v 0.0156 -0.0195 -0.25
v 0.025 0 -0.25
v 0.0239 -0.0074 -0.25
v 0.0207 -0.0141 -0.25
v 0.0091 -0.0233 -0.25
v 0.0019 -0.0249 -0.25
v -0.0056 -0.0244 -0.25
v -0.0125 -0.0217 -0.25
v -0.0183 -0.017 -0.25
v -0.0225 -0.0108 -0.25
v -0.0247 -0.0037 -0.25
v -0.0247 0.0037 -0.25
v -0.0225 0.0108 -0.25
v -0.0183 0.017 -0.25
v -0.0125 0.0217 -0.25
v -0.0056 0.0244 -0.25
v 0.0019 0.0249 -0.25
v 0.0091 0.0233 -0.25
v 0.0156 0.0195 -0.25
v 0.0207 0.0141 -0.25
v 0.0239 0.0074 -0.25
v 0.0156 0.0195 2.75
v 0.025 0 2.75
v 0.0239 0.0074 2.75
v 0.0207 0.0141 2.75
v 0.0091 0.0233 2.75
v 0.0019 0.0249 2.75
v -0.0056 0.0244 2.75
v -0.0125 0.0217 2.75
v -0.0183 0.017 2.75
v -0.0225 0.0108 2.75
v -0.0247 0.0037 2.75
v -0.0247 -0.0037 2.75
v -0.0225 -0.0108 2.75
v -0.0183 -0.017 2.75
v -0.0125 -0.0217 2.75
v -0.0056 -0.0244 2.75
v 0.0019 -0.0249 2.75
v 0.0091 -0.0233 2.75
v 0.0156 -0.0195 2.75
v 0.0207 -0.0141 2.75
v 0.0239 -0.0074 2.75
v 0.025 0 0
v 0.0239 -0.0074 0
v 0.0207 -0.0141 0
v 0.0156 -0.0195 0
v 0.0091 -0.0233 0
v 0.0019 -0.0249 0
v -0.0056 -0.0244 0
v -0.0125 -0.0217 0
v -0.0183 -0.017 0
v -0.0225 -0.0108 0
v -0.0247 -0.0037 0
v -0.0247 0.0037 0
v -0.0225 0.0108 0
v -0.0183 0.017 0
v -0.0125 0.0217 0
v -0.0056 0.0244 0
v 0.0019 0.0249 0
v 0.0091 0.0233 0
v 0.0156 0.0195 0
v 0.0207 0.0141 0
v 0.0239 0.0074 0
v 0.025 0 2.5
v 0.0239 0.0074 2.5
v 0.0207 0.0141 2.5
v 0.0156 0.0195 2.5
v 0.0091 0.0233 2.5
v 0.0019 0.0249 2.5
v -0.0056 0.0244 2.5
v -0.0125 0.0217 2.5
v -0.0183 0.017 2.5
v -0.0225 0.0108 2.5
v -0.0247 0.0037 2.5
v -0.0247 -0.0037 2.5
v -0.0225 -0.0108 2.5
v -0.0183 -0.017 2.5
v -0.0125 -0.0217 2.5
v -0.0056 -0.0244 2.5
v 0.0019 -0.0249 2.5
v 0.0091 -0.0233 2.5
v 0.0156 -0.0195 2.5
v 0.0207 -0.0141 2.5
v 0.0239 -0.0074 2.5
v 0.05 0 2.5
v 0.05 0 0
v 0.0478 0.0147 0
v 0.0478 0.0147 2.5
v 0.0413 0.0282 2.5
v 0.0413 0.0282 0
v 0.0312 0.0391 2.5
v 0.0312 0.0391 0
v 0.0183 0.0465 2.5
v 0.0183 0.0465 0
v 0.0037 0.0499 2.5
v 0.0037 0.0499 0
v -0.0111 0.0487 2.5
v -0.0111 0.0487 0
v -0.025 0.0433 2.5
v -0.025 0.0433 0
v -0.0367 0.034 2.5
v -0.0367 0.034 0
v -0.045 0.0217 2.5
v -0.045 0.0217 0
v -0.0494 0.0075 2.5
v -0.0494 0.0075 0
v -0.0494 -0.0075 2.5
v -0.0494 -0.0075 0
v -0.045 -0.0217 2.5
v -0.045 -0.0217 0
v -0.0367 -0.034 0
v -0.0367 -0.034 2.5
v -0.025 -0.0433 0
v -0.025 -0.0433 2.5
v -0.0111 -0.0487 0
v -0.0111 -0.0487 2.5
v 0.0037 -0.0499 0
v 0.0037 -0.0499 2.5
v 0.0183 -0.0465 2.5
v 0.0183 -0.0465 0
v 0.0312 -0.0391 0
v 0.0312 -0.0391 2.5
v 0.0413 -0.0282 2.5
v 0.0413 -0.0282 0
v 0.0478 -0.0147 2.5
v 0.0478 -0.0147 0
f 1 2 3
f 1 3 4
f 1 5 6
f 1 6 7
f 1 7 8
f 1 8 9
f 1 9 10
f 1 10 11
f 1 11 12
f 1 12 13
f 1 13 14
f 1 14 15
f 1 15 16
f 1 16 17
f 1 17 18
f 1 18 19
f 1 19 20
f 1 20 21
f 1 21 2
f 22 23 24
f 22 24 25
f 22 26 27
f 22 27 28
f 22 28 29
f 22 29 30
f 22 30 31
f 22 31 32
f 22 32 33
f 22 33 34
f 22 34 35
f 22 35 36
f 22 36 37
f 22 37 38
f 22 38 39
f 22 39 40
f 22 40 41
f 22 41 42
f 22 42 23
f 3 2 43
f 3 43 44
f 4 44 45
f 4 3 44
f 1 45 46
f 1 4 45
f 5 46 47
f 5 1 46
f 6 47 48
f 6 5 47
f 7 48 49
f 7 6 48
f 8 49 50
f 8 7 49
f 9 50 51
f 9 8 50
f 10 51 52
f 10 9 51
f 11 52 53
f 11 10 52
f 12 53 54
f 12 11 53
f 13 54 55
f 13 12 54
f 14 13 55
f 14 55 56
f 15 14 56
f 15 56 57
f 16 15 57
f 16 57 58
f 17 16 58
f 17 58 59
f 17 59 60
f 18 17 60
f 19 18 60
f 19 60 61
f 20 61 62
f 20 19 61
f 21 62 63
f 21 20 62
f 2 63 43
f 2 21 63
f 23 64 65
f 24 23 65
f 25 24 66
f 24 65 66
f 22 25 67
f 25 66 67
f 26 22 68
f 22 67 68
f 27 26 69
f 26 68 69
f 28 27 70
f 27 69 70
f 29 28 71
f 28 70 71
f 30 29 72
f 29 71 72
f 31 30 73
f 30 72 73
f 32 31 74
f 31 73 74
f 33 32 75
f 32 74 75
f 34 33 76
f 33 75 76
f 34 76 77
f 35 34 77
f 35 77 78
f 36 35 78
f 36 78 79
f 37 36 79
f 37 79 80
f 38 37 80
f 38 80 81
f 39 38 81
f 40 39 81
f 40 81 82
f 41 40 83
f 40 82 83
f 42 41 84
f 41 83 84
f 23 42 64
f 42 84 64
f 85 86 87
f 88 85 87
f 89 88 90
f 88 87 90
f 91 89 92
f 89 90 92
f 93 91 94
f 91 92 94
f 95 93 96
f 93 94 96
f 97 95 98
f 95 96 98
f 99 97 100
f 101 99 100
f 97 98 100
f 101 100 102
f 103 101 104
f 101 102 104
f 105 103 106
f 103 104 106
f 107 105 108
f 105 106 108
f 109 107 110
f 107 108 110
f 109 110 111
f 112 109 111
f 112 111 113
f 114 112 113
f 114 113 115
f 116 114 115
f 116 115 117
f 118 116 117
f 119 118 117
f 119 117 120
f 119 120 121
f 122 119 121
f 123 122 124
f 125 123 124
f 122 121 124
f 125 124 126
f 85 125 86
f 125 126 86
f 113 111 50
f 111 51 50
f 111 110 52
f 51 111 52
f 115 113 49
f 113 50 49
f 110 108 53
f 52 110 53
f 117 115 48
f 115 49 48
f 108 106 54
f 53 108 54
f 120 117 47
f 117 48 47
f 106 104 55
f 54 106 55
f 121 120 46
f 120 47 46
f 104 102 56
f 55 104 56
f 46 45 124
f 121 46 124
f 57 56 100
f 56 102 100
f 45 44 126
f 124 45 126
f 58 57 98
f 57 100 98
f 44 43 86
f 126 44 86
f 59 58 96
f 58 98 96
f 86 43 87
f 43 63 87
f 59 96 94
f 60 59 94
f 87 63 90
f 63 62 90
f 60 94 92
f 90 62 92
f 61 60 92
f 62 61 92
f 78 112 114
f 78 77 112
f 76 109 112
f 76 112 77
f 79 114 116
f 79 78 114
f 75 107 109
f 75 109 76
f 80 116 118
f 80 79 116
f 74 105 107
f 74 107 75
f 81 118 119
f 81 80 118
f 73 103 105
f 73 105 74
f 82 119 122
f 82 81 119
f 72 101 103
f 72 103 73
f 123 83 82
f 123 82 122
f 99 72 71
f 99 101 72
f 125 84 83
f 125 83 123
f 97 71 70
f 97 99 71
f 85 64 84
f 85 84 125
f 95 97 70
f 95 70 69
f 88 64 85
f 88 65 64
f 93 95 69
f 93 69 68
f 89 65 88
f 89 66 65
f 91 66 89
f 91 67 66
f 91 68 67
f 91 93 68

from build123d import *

# Parameters (mm, degrees)
CROQUIS1_R              = 0.05
SALIENTE_EXTRUIR1_DEPTH = 2.5
CROQUIS2_R              = 0.025
SALIENTE_EXTRUIR3_DEPTH = 0.25
SALIENTE_EXTRUIR4_START = 0.25
CROQUIS3_R              = 0.025
SALIENTE_EXTRUIR4_DEPTH = 0.25


with BuildPart() as part:
    # Croquis1 → Saliente-Extruir1 (new body)
    with BuildSketch(Plane.XY):
        Circle(CROQUIS1_R)
    extrude(amount=SALIENTE_EXTRUIR1_DEPTH)

    # Croquis2 → Saliente-Extruir3 (add)
    with BuildSketch(Plane.XY.offset(2.5)):
        Circle(CROQUIS2_R)
    extrude(amount=SALIENTE_EXTRUIR3_DEPTH)

    # Croquis3 → Saliente-Extruir4 (add)
    with BuildSketch(Plane(origin=(0, 0, 0), x_dir=(-1, 0, 0), z_dir=(0, 0, -1)).offset(SALIENTE_EXTRUIR4_START)):
        with Locations(Location((0, 0, 0), (0, 0, 180))):
            Circle(CROQUIS3_R)
    extrude(amount=-SALIENTE_EXTRUIR4_DEPTH)


solid = part.part
